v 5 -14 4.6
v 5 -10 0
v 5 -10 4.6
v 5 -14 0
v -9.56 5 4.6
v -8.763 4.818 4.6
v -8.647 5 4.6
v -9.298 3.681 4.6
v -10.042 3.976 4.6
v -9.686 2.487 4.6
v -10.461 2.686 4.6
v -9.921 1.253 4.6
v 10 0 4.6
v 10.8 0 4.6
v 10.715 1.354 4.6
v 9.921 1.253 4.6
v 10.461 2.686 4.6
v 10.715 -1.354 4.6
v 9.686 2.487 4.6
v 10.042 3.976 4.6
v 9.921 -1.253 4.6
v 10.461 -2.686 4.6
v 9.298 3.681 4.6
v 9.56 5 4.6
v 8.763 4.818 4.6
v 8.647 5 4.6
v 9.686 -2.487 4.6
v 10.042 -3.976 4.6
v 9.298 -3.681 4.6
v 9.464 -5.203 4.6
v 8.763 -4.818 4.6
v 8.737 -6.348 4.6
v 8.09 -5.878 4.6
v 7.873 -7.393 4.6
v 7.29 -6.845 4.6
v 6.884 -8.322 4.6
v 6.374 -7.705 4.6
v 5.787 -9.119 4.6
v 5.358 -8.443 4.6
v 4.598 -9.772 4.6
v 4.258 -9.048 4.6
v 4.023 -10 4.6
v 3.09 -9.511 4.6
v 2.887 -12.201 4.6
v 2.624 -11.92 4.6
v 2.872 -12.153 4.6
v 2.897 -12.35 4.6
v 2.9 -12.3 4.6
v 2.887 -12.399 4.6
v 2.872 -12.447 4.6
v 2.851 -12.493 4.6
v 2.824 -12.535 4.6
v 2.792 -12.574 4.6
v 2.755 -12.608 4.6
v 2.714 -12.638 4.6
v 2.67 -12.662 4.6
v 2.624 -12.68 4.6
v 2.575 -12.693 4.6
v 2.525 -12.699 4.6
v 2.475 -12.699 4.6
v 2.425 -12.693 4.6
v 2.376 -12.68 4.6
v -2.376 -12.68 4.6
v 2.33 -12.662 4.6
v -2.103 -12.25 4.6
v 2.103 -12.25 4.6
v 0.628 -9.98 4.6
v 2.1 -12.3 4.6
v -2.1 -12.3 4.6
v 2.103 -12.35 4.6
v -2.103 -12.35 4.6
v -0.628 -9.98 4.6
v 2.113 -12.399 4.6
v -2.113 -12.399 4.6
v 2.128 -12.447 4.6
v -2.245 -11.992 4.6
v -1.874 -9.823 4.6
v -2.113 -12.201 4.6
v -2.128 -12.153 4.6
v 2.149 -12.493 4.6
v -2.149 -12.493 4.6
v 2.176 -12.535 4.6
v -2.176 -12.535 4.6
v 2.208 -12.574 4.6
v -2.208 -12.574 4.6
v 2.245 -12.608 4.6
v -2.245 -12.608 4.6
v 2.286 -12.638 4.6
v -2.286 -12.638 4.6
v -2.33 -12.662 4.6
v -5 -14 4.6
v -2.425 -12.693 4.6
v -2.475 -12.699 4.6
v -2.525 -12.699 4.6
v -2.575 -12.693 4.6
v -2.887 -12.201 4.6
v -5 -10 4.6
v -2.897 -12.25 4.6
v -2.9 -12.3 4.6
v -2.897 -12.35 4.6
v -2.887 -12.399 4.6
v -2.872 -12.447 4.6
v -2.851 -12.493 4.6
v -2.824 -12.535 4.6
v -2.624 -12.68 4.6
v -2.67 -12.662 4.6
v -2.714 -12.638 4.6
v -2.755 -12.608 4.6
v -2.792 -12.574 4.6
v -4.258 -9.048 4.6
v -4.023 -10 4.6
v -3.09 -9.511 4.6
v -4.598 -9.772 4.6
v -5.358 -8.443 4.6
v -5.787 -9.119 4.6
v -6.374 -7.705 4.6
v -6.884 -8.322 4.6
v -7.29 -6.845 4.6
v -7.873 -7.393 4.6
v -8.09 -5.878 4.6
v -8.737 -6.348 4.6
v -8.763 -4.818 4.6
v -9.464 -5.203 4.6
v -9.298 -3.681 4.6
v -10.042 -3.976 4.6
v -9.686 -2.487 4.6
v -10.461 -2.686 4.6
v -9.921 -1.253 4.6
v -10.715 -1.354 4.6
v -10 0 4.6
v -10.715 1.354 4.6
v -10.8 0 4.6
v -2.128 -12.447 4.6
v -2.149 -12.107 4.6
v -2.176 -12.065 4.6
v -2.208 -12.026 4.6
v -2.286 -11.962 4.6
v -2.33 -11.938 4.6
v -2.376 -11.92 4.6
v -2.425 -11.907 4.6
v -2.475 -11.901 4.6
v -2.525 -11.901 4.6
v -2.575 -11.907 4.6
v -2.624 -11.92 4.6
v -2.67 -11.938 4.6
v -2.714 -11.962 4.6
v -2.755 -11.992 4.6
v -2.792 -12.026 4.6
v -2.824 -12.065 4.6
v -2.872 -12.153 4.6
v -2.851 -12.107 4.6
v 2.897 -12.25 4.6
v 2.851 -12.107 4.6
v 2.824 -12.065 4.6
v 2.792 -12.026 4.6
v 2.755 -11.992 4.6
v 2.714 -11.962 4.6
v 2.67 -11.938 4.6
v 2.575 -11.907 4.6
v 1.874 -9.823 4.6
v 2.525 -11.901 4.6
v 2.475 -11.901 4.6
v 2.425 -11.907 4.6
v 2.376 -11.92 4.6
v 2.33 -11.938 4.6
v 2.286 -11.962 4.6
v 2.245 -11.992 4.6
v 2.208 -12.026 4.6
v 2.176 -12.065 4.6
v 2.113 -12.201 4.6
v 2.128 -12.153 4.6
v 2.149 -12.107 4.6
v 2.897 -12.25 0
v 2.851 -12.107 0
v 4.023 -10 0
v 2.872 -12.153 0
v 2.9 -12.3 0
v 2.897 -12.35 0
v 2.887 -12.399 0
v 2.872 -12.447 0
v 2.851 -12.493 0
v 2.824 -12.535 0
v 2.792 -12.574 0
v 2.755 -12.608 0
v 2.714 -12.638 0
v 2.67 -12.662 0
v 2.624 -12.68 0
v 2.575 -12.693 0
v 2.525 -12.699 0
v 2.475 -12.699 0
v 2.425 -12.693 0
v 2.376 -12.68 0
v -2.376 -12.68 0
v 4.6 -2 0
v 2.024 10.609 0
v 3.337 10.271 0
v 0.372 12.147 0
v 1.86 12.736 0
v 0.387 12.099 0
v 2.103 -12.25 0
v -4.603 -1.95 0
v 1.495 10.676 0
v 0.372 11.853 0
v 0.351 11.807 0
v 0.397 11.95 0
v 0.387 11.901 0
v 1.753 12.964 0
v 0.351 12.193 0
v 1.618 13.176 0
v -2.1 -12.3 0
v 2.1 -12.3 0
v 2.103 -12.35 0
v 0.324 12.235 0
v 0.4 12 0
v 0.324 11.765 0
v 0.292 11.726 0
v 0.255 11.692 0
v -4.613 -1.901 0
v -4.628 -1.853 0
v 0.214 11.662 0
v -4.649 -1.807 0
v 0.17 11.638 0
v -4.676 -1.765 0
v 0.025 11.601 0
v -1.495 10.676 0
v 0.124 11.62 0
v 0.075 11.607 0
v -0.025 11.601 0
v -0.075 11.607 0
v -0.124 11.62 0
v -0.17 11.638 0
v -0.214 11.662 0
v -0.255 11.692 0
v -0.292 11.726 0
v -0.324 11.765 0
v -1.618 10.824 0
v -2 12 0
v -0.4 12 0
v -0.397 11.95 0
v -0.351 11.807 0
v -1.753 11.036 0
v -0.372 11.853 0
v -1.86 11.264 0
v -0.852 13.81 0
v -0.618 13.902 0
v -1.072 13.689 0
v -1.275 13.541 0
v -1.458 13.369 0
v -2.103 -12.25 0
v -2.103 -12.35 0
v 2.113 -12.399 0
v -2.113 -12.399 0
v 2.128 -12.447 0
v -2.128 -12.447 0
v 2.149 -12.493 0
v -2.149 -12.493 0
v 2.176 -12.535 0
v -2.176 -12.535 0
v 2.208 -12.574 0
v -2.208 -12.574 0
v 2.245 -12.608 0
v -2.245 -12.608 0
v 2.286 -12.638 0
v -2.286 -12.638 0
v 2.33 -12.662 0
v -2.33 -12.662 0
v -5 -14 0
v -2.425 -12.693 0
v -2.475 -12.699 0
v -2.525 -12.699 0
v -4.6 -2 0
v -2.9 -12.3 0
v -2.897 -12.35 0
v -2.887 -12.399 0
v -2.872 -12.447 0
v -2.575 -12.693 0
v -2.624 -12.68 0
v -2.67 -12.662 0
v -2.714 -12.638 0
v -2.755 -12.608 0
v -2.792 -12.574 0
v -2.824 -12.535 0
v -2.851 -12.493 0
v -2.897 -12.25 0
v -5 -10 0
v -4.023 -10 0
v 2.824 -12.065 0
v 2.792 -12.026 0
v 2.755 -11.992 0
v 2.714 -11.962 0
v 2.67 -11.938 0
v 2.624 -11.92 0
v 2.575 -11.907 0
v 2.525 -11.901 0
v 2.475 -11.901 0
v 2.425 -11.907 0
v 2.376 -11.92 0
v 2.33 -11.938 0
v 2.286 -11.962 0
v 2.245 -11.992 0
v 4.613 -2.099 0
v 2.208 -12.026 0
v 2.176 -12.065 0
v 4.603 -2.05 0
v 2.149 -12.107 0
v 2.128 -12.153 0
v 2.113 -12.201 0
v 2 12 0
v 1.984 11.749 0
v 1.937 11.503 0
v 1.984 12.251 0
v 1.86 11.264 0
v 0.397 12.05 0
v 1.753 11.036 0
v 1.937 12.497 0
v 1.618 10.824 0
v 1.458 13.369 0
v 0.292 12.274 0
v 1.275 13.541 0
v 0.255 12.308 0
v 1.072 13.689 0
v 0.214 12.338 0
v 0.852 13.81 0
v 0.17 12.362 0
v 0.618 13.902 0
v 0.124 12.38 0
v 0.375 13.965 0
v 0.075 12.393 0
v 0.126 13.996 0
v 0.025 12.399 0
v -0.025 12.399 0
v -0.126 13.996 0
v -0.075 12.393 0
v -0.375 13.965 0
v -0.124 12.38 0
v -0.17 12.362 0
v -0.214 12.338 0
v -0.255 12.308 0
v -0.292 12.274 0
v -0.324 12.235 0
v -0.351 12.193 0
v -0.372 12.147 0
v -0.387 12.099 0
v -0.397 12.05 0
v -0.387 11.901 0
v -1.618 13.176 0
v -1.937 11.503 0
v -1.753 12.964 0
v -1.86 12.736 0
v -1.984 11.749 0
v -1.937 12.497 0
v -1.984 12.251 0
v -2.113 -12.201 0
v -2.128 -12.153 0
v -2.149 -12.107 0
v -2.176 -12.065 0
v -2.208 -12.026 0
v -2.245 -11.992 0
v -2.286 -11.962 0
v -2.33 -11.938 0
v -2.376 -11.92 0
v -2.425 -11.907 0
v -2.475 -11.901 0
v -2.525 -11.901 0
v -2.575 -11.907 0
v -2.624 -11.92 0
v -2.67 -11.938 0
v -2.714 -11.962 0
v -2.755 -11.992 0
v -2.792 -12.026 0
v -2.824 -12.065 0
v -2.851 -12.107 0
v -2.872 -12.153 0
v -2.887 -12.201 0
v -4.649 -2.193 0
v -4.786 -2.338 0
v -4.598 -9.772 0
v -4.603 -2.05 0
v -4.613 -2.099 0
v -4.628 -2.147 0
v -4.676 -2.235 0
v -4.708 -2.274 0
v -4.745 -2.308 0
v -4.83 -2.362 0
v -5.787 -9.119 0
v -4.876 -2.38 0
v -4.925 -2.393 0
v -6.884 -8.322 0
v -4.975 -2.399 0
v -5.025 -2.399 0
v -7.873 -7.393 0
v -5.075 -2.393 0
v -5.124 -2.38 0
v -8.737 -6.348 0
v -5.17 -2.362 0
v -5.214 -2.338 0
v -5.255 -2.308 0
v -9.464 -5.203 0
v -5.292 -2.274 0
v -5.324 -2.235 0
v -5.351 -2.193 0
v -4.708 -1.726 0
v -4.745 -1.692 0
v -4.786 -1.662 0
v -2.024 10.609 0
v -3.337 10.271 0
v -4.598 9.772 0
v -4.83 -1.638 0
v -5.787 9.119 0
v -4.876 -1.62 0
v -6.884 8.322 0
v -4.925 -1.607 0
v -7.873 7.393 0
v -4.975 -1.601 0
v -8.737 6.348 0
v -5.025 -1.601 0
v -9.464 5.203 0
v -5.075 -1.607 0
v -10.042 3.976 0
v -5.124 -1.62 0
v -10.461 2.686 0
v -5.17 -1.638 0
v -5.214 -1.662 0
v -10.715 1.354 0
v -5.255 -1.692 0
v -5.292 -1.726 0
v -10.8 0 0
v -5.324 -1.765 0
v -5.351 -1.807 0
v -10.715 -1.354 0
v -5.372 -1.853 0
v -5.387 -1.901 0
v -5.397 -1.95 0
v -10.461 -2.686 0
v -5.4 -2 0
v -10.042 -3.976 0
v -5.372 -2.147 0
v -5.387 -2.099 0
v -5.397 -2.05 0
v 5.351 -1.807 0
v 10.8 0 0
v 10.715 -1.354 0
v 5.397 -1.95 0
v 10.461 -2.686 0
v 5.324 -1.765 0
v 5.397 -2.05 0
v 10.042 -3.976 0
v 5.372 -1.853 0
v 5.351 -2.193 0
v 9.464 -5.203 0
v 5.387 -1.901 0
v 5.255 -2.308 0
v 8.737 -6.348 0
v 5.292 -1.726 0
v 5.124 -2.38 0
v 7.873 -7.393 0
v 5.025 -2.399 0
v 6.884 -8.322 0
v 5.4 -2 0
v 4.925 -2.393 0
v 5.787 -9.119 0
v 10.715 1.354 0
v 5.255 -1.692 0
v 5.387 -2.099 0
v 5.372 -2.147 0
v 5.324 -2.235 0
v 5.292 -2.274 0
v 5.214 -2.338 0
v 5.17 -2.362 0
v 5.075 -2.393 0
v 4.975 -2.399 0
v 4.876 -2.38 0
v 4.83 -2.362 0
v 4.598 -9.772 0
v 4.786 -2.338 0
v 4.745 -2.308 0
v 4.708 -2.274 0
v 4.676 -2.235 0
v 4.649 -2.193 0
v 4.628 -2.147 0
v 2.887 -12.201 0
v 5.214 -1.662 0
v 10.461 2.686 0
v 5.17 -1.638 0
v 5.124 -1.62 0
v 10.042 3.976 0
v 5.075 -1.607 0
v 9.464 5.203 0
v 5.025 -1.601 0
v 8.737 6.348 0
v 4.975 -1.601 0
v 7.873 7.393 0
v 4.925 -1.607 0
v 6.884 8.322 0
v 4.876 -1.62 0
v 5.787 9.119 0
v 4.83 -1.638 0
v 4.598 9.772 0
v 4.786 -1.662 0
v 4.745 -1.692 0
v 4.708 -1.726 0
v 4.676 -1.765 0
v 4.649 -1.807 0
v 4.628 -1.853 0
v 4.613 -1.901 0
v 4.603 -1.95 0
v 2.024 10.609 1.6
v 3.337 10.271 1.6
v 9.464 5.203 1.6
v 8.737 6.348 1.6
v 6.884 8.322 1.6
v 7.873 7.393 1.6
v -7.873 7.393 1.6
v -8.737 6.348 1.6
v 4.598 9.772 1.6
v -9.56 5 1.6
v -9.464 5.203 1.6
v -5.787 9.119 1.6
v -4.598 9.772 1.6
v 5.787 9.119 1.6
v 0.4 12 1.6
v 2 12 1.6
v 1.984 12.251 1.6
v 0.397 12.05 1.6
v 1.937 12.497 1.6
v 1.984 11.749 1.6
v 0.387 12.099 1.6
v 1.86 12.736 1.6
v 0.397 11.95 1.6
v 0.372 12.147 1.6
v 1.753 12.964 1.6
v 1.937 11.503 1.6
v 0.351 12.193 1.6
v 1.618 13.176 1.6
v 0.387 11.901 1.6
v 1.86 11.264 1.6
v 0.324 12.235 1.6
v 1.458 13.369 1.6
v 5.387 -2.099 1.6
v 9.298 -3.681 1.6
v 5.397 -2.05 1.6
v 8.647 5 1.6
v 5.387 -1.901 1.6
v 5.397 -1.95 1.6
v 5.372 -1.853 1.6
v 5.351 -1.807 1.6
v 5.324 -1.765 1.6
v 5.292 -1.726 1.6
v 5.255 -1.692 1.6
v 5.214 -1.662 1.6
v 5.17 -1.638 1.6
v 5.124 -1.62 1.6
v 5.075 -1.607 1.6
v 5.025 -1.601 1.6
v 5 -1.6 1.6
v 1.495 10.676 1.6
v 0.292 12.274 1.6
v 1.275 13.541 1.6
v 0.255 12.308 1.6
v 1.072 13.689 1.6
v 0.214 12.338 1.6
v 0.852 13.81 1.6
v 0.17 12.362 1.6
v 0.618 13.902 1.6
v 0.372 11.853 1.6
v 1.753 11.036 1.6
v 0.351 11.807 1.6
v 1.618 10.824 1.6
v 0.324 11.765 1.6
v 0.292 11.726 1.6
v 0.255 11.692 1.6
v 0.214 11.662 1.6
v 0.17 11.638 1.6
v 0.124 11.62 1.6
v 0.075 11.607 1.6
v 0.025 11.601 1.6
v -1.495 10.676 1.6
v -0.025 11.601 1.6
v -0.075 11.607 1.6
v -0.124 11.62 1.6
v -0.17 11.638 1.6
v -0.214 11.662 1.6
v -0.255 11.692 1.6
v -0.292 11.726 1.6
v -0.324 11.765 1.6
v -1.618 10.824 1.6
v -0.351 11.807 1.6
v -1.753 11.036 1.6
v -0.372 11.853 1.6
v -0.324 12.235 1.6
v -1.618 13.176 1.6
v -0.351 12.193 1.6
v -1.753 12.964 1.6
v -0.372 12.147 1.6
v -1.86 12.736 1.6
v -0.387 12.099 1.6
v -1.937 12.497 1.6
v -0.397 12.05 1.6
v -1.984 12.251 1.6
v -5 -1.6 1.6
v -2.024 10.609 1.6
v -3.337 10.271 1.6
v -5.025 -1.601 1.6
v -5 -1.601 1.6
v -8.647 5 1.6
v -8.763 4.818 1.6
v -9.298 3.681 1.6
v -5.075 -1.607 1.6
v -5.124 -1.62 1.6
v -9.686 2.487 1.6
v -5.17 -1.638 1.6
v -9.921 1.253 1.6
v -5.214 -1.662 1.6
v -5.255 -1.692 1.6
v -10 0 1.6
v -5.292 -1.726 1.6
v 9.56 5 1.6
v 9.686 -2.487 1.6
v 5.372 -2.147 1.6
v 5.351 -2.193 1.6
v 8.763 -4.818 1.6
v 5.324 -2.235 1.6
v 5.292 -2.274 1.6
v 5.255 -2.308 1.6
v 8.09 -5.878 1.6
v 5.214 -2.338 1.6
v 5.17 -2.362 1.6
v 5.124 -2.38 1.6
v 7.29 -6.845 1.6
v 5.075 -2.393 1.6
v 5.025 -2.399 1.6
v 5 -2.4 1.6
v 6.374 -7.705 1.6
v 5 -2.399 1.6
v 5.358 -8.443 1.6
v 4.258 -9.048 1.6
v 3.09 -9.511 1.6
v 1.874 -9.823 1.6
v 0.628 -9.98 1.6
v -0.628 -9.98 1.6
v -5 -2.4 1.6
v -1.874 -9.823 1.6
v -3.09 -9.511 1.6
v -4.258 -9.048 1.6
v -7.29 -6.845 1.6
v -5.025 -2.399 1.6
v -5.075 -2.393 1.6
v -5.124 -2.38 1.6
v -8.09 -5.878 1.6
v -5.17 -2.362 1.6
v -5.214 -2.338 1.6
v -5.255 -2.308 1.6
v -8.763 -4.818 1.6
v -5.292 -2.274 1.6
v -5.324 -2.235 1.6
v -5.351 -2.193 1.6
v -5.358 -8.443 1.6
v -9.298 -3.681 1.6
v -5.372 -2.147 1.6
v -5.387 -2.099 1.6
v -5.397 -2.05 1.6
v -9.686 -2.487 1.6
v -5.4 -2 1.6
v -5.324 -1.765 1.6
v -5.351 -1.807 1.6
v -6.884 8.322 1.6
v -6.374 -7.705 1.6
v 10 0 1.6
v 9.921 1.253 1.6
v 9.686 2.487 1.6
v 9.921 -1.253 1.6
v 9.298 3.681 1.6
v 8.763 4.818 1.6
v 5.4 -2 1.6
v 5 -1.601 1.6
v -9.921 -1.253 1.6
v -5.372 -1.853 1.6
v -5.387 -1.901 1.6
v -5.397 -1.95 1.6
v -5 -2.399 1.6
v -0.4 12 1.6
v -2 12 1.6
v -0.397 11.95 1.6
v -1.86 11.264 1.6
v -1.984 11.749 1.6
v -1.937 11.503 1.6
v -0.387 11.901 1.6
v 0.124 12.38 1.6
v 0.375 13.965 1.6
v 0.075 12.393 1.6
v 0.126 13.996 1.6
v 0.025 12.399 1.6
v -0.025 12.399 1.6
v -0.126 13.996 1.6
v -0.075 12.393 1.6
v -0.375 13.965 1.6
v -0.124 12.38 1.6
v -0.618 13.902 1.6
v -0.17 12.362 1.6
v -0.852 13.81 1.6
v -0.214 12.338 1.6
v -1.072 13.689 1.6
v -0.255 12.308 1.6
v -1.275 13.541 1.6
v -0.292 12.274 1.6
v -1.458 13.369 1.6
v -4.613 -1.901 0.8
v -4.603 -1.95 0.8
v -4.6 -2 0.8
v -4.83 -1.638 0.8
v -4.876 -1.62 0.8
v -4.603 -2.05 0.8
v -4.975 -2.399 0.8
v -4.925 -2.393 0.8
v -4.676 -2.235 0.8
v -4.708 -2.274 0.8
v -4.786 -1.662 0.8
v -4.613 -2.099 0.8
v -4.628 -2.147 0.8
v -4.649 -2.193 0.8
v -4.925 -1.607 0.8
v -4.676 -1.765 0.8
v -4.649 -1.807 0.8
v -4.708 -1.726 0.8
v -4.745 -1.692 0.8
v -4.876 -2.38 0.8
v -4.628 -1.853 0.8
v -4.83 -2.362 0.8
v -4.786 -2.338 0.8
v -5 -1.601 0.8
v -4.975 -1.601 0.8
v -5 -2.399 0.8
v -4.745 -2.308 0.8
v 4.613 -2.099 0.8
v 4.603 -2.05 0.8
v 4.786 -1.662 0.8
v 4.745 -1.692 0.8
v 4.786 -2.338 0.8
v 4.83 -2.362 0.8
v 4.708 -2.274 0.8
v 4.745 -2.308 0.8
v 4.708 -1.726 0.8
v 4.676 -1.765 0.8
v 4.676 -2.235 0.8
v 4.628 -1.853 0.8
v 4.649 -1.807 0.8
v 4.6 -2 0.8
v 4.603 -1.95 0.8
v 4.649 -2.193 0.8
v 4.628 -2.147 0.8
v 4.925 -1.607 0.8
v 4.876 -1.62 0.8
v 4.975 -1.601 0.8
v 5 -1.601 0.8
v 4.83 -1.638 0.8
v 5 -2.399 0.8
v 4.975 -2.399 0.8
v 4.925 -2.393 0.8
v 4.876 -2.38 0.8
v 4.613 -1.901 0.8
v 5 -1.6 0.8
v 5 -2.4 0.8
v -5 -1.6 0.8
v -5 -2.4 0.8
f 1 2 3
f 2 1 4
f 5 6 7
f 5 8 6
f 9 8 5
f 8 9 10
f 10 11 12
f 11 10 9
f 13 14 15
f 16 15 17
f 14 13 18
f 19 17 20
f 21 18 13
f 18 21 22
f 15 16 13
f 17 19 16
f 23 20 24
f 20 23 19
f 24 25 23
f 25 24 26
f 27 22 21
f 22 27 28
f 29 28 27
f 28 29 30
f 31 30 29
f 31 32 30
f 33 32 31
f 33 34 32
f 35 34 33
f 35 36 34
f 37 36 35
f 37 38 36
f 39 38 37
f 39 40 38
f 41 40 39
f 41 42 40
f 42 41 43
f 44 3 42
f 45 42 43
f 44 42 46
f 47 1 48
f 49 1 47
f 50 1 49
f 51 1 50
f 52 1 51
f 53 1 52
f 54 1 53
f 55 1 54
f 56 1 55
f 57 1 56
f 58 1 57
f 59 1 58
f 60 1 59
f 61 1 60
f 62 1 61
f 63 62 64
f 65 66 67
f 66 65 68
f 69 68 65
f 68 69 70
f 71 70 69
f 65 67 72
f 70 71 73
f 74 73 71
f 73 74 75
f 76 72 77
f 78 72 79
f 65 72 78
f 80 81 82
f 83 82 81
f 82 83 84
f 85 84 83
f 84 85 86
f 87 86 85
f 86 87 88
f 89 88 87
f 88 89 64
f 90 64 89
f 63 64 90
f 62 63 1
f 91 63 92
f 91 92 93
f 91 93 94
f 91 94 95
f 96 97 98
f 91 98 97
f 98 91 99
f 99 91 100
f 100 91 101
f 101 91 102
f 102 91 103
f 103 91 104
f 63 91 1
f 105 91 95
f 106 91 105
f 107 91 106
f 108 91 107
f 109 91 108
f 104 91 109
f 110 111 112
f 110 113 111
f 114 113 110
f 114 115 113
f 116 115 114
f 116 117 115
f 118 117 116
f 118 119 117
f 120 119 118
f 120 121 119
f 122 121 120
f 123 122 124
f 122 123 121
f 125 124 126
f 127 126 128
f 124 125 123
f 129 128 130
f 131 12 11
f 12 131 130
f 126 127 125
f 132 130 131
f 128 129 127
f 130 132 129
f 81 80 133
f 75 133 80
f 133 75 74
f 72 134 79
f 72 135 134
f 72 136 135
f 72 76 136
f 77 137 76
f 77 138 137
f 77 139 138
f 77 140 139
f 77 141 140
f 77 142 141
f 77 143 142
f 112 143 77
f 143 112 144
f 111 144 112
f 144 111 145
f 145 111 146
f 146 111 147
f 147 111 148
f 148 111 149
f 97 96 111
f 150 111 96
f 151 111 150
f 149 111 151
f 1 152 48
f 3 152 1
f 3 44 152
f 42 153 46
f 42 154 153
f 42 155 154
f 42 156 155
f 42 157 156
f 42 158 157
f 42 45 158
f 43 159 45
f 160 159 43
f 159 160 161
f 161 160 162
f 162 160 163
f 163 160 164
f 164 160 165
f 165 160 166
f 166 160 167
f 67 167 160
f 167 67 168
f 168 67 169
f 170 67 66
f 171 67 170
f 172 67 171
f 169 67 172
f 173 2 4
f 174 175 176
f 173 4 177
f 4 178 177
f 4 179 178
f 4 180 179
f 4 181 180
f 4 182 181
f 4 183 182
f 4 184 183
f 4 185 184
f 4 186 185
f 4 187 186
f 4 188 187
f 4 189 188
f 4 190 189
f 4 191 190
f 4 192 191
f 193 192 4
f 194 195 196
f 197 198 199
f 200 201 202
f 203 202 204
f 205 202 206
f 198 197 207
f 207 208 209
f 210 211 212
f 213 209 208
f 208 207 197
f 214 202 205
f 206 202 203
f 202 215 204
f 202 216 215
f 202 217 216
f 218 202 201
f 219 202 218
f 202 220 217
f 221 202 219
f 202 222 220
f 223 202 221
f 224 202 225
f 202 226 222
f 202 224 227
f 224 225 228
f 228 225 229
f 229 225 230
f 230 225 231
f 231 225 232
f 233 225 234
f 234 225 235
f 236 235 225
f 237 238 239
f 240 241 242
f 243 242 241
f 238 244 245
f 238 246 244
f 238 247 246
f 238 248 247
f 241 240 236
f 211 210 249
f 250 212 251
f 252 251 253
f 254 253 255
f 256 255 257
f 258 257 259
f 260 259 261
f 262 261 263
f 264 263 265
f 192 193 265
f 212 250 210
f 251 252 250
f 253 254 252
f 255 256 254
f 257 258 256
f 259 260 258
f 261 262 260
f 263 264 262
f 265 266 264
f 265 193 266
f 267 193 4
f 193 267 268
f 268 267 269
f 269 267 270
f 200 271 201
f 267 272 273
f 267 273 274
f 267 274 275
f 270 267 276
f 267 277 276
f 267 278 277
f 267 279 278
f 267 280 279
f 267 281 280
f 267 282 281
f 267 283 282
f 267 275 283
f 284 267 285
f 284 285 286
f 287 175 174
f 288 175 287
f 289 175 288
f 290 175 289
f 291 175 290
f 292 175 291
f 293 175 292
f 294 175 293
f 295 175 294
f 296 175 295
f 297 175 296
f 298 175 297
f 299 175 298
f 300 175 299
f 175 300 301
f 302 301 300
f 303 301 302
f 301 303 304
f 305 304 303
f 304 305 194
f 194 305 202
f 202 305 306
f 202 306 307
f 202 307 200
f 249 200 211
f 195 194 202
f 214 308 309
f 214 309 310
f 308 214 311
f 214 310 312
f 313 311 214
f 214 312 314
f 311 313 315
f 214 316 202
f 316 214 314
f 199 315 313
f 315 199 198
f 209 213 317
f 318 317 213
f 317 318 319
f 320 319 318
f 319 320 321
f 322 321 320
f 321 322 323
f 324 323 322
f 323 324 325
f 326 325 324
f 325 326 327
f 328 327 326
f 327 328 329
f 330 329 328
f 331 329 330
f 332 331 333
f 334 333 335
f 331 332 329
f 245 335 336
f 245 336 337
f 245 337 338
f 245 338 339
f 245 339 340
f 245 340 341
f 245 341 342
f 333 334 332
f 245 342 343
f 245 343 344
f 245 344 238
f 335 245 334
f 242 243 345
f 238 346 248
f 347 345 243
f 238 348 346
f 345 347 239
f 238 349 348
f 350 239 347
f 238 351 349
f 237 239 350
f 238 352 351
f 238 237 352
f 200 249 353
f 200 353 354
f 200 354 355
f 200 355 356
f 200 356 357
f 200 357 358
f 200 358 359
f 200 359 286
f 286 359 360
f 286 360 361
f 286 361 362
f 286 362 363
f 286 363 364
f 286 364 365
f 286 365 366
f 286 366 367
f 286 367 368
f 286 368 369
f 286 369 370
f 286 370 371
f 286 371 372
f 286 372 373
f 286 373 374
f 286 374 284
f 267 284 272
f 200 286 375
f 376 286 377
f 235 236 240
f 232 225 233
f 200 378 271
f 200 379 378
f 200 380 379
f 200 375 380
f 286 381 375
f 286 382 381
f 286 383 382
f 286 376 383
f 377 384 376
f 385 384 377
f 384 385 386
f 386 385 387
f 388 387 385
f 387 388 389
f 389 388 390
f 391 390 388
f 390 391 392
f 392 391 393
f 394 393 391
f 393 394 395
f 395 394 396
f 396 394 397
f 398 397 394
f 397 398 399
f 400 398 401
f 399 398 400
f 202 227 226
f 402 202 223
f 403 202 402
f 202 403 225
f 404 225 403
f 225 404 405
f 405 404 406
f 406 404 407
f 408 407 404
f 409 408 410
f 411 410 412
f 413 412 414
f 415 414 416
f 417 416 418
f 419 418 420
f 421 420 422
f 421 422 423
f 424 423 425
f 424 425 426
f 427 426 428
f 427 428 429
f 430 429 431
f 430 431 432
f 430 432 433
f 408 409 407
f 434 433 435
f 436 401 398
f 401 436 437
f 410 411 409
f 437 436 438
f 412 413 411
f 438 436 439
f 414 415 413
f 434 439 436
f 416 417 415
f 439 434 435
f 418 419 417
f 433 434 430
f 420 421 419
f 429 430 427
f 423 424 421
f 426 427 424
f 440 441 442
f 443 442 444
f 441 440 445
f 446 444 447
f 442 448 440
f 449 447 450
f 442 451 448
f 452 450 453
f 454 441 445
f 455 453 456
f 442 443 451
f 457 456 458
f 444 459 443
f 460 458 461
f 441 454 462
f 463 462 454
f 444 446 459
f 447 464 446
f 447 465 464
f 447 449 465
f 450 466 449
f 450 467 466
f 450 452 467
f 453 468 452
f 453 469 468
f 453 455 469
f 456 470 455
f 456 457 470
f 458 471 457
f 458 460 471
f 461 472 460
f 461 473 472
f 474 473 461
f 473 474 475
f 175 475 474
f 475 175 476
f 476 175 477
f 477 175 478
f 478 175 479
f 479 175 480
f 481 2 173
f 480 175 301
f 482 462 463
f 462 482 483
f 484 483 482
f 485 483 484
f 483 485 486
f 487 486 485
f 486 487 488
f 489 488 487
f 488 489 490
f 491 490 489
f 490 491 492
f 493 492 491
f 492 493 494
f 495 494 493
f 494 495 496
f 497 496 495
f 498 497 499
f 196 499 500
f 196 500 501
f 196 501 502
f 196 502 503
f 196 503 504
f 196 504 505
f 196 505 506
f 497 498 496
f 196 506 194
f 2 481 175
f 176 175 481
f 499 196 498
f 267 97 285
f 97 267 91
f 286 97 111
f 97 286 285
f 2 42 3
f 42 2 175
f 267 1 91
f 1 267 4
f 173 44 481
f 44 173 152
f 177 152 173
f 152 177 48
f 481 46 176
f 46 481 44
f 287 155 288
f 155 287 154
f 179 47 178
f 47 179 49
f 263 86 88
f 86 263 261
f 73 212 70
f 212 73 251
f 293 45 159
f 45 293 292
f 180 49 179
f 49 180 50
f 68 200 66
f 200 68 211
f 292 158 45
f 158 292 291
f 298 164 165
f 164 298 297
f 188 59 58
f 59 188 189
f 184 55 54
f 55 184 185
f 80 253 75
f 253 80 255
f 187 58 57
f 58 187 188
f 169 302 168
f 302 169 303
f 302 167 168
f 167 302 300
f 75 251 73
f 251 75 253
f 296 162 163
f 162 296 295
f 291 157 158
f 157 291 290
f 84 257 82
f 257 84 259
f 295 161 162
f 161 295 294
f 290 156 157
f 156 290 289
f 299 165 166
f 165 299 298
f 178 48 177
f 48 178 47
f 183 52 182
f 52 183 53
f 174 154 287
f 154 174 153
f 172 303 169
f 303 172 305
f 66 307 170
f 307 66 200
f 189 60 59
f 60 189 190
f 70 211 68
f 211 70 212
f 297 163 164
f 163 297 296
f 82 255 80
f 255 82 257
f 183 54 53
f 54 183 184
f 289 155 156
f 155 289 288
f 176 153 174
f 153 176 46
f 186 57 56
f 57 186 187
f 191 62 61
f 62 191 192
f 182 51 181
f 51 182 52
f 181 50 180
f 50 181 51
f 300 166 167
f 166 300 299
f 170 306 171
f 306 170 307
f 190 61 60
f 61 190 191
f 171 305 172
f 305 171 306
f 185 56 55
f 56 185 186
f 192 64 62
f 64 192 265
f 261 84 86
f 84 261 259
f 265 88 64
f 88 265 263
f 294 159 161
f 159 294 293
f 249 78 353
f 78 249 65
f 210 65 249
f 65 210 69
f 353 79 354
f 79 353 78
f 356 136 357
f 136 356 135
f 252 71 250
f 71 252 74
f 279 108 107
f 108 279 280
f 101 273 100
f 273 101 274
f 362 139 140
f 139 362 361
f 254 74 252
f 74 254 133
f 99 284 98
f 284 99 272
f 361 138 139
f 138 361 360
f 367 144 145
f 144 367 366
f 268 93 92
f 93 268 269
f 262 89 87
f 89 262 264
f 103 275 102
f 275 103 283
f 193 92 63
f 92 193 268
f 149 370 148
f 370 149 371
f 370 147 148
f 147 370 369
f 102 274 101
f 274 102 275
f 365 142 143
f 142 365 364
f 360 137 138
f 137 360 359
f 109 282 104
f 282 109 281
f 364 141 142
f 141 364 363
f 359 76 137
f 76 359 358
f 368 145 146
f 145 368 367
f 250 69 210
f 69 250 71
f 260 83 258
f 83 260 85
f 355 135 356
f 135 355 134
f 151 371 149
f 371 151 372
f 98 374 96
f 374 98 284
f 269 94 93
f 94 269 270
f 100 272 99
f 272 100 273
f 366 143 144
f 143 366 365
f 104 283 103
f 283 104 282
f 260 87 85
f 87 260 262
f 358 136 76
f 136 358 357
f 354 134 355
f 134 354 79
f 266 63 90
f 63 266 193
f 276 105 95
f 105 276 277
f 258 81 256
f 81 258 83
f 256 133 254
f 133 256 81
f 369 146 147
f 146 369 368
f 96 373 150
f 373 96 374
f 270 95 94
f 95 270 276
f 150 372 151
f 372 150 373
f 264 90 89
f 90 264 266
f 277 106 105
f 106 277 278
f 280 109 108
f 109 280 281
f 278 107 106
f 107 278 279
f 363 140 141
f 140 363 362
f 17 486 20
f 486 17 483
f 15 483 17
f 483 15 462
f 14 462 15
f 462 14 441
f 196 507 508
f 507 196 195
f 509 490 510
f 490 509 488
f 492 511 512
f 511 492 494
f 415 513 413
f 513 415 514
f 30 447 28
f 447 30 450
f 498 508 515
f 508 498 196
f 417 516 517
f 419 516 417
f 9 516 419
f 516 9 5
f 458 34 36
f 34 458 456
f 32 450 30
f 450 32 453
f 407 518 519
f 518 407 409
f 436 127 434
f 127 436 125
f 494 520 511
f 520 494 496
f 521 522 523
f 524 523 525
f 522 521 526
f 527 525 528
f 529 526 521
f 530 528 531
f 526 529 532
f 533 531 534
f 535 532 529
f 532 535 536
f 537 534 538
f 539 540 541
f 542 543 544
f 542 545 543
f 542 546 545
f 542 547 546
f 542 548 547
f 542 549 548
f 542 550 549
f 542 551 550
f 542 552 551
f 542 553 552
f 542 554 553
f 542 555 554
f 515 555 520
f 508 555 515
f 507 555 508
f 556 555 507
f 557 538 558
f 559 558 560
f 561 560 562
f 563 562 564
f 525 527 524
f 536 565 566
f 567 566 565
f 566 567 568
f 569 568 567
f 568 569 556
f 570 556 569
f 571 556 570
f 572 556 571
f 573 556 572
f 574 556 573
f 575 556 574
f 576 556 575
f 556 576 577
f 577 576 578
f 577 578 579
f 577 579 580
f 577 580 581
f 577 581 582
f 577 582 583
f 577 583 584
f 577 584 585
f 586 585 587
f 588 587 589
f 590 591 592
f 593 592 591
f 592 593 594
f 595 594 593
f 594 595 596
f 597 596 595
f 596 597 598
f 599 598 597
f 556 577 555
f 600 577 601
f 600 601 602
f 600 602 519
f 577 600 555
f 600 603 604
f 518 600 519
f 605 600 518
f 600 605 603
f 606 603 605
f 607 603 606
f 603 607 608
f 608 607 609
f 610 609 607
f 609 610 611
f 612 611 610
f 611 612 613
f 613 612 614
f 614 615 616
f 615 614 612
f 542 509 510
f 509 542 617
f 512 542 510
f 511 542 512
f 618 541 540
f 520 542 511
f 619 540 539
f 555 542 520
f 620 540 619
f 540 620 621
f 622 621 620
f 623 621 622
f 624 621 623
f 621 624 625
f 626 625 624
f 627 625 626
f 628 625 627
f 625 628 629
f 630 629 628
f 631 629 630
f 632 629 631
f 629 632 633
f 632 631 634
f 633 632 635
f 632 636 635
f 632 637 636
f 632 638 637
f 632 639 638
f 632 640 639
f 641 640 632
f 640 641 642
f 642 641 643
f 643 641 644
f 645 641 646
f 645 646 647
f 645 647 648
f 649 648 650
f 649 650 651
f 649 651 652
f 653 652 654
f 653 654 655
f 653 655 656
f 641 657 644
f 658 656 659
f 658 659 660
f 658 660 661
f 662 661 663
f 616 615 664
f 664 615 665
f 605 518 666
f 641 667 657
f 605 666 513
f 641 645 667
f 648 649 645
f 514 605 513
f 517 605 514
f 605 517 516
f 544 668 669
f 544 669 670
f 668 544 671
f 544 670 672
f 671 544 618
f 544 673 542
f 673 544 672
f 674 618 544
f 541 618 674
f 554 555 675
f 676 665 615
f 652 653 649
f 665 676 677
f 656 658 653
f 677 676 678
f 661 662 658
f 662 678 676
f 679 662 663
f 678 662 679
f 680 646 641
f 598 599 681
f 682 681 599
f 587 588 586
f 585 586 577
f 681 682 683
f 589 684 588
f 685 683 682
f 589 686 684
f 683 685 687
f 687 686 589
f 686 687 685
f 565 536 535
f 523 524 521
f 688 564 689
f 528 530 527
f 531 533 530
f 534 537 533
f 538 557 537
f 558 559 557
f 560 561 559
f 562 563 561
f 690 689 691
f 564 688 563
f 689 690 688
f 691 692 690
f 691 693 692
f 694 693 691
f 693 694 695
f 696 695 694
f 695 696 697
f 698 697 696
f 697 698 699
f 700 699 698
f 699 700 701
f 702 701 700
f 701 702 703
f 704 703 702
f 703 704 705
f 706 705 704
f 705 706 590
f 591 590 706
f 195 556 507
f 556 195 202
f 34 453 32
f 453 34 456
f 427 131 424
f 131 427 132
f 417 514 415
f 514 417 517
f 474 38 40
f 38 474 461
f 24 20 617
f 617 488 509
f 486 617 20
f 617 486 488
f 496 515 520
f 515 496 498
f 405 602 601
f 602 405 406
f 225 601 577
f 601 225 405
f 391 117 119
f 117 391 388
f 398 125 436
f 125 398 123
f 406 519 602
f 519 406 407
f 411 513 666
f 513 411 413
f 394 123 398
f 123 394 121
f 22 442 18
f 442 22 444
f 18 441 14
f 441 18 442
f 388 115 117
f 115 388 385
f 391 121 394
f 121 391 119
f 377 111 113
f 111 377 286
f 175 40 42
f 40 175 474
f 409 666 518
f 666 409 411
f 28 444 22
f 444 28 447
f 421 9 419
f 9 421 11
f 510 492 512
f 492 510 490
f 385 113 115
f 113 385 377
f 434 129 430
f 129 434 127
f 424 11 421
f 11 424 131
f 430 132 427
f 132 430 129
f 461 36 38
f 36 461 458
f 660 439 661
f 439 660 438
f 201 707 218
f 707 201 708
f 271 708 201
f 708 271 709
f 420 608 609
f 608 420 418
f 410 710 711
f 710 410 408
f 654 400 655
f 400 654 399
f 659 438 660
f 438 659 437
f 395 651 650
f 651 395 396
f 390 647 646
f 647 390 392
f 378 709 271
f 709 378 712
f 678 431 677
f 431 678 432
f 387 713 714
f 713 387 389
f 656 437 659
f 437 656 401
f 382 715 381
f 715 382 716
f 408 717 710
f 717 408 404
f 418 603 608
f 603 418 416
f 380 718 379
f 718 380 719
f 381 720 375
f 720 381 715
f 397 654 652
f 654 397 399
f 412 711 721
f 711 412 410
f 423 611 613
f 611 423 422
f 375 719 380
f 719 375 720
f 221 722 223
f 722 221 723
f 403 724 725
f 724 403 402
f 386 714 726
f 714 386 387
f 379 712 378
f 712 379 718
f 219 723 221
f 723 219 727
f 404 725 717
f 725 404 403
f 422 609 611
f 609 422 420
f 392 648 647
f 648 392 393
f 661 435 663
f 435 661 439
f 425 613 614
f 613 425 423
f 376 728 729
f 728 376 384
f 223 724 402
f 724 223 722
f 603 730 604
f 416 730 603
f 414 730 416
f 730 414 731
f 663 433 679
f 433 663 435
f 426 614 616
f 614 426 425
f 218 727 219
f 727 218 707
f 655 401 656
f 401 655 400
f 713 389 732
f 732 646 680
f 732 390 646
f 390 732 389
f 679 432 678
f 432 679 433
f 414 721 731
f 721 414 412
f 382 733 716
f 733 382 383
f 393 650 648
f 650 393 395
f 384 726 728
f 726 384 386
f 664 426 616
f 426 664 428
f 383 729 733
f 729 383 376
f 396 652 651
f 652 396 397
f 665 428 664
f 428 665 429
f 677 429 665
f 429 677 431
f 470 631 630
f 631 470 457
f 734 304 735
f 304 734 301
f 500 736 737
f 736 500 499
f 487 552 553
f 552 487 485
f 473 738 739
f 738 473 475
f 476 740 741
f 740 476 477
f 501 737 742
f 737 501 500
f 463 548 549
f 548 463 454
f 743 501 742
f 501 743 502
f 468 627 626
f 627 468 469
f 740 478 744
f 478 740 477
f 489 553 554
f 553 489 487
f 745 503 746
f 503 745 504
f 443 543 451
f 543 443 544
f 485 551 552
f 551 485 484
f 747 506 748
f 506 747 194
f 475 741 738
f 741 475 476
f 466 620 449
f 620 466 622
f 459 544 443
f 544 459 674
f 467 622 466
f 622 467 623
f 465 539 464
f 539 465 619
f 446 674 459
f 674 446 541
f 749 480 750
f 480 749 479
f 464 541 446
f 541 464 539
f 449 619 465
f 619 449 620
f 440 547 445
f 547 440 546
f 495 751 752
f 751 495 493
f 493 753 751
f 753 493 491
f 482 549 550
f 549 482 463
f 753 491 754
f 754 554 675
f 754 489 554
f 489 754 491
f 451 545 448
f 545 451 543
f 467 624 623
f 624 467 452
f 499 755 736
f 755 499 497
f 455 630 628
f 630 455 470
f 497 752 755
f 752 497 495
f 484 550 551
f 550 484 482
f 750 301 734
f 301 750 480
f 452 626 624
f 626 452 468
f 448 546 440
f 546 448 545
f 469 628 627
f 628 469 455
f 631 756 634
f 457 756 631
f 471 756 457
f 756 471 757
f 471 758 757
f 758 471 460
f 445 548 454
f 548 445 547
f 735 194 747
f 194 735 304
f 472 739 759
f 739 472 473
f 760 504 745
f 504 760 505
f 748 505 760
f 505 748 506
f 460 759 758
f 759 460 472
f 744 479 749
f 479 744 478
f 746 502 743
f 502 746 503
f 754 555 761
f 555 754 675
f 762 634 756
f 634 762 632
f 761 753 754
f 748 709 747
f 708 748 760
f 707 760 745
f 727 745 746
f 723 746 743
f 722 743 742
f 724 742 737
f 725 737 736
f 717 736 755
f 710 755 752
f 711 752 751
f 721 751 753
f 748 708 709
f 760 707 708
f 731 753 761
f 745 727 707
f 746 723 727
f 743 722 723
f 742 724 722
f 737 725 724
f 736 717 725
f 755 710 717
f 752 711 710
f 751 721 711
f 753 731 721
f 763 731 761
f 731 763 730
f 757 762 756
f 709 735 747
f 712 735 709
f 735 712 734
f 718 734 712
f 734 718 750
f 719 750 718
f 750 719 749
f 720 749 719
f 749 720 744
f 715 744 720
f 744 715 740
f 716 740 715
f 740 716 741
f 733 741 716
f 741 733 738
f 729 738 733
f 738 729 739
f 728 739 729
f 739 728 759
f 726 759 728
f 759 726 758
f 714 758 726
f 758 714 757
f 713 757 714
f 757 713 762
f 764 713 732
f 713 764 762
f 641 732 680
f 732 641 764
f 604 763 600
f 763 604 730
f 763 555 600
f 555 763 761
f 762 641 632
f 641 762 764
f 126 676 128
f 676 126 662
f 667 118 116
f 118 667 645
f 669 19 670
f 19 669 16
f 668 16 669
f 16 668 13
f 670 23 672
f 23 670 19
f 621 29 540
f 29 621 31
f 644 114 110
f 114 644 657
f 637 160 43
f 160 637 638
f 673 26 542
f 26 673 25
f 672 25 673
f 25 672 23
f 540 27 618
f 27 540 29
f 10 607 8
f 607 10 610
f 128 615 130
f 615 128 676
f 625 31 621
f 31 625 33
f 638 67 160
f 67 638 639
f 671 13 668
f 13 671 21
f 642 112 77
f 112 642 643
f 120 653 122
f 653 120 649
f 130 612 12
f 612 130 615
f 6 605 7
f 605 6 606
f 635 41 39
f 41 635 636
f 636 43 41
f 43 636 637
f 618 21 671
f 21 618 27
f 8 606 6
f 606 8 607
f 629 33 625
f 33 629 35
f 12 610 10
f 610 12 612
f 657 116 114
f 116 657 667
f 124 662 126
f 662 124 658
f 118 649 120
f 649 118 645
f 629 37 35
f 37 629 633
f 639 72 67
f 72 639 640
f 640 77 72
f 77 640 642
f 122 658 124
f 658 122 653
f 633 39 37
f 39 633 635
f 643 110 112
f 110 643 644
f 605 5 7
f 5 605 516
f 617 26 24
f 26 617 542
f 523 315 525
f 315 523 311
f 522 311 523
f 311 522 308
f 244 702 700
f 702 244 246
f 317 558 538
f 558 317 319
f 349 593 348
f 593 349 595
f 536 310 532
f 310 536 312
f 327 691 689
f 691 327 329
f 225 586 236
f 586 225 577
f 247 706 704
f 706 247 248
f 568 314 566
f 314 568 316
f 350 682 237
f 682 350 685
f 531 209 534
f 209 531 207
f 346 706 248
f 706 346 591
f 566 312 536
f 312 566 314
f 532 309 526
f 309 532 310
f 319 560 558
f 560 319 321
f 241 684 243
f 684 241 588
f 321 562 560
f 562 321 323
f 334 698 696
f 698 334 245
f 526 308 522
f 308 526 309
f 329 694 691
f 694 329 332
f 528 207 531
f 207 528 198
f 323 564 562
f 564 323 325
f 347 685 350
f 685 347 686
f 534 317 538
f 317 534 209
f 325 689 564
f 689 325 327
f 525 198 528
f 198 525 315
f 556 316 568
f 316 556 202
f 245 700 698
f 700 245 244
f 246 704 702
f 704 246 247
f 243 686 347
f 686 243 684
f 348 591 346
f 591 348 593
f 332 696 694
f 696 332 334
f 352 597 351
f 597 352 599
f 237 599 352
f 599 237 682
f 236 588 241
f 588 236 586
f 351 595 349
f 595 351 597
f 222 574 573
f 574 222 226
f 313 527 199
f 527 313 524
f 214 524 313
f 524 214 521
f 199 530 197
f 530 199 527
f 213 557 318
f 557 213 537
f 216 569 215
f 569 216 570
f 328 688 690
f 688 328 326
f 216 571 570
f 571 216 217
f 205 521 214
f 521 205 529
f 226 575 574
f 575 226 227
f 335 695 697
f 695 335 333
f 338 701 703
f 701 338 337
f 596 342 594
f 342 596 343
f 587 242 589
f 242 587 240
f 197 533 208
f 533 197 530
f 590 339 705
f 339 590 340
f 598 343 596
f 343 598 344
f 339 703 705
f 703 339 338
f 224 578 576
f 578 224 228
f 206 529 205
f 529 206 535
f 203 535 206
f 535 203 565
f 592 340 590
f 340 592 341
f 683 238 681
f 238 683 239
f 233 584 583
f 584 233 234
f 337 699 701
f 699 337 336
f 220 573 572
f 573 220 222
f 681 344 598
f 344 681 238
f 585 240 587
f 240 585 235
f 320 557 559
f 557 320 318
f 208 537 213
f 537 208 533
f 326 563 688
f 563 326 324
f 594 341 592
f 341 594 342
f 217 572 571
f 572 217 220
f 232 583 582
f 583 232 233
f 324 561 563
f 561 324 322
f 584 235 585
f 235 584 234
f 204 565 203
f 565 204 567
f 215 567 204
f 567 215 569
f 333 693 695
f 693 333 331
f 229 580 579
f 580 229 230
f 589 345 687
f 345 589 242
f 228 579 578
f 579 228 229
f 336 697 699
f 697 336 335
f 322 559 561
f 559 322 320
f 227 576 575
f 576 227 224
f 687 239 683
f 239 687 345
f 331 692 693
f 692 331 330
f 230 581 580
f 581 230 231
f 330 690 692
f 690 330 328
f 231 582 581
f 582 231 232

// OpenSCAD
// [FL_INDEX: keywords="openscad, 3d_parametric, Customizable_coin_battery_pack, csg_solid" | COT="Parametric OpenSCAD design from 3DCodeverse"]
// Title: Customizable coin battery pack

// Licence: Creative Commons, Attribution
// Parametrized button battery clip holder

// Thingiverse user by bmcage
// Same idea as http://www.thingiverse.com/thing:48606 but 
// parametric


//what button battery should this hold
battery = "CR2032";  //[CR2032, AG13, custom]
//if custom battery, what is radius ?
custom_radius = 10; // [5:30]
//if custom battery, what is width ?
custom_width = 3; // [1:10]
//width of edges, hint: take 2*nozzle diameter of your printer
edge = 0.8;

module divider(radius,width) {
  difference() {
    cylinder(r=radius+edge, h=edge+0.8,$fn=50);
    translate([-radius/2,-2,0]) cylinder(r=0.4, h=edge+10,center=true,$fn=50);
    translate([radius/2,-2,0]) cylinder(r=0.4, h=edge+10,center=true,$fn=50);
    translate([-radius/2, -2-0.8/2,edge]) cube([radius,0.8,2*0.8]);
    }  
  difference() {
    cylinder(r=radius+edge, h=edge+0.8+width,$fn=50);
    cylinder(r=radius, h=4*(edge+0.8+width),$fn=50, center=true);
    translate([0,2*radius+radius/2,width+edge+0.8]) cube([4*radius, 4*radius,2*width], center = true);
    }
  
}

module holder(radius, width) {
  union() {
    difference() {
      translate([-radius/2,-radius-4,0]) cube([radius, 4, width+edge+0.8]);
      translate([radius/4, -radius-edge-1.5,0])cylinder(r=0.4, h=2*(width+edge+10),center=true,$fn=50);
      translate([-radius/4, -radius-edge-1.5,0])cylinder(r=0.4, h=2*(width+edge+10),center=true,$fn=50);
      }
    divider(radius,width);
    //now a ring to hang it to something
    difference() {
      translate([0,radius+0.4+2*edge,0]) cylinder(r=0.4+2*edge, h=edge+0.8,$fn=50);
      translate([0,radius+0.4+2*edge,-0.8]) cylinder(r=0.4, h=2*(edge+0.8),$fn=50);
    }
  }
}


if (battery == "CR2032") {
    holder(10, 3);
}
if (battery == "AG13") {
    holder(6, 6.3);
}
if (battery == "custom") {
    holder(custom_radius,custom_width);
} 
